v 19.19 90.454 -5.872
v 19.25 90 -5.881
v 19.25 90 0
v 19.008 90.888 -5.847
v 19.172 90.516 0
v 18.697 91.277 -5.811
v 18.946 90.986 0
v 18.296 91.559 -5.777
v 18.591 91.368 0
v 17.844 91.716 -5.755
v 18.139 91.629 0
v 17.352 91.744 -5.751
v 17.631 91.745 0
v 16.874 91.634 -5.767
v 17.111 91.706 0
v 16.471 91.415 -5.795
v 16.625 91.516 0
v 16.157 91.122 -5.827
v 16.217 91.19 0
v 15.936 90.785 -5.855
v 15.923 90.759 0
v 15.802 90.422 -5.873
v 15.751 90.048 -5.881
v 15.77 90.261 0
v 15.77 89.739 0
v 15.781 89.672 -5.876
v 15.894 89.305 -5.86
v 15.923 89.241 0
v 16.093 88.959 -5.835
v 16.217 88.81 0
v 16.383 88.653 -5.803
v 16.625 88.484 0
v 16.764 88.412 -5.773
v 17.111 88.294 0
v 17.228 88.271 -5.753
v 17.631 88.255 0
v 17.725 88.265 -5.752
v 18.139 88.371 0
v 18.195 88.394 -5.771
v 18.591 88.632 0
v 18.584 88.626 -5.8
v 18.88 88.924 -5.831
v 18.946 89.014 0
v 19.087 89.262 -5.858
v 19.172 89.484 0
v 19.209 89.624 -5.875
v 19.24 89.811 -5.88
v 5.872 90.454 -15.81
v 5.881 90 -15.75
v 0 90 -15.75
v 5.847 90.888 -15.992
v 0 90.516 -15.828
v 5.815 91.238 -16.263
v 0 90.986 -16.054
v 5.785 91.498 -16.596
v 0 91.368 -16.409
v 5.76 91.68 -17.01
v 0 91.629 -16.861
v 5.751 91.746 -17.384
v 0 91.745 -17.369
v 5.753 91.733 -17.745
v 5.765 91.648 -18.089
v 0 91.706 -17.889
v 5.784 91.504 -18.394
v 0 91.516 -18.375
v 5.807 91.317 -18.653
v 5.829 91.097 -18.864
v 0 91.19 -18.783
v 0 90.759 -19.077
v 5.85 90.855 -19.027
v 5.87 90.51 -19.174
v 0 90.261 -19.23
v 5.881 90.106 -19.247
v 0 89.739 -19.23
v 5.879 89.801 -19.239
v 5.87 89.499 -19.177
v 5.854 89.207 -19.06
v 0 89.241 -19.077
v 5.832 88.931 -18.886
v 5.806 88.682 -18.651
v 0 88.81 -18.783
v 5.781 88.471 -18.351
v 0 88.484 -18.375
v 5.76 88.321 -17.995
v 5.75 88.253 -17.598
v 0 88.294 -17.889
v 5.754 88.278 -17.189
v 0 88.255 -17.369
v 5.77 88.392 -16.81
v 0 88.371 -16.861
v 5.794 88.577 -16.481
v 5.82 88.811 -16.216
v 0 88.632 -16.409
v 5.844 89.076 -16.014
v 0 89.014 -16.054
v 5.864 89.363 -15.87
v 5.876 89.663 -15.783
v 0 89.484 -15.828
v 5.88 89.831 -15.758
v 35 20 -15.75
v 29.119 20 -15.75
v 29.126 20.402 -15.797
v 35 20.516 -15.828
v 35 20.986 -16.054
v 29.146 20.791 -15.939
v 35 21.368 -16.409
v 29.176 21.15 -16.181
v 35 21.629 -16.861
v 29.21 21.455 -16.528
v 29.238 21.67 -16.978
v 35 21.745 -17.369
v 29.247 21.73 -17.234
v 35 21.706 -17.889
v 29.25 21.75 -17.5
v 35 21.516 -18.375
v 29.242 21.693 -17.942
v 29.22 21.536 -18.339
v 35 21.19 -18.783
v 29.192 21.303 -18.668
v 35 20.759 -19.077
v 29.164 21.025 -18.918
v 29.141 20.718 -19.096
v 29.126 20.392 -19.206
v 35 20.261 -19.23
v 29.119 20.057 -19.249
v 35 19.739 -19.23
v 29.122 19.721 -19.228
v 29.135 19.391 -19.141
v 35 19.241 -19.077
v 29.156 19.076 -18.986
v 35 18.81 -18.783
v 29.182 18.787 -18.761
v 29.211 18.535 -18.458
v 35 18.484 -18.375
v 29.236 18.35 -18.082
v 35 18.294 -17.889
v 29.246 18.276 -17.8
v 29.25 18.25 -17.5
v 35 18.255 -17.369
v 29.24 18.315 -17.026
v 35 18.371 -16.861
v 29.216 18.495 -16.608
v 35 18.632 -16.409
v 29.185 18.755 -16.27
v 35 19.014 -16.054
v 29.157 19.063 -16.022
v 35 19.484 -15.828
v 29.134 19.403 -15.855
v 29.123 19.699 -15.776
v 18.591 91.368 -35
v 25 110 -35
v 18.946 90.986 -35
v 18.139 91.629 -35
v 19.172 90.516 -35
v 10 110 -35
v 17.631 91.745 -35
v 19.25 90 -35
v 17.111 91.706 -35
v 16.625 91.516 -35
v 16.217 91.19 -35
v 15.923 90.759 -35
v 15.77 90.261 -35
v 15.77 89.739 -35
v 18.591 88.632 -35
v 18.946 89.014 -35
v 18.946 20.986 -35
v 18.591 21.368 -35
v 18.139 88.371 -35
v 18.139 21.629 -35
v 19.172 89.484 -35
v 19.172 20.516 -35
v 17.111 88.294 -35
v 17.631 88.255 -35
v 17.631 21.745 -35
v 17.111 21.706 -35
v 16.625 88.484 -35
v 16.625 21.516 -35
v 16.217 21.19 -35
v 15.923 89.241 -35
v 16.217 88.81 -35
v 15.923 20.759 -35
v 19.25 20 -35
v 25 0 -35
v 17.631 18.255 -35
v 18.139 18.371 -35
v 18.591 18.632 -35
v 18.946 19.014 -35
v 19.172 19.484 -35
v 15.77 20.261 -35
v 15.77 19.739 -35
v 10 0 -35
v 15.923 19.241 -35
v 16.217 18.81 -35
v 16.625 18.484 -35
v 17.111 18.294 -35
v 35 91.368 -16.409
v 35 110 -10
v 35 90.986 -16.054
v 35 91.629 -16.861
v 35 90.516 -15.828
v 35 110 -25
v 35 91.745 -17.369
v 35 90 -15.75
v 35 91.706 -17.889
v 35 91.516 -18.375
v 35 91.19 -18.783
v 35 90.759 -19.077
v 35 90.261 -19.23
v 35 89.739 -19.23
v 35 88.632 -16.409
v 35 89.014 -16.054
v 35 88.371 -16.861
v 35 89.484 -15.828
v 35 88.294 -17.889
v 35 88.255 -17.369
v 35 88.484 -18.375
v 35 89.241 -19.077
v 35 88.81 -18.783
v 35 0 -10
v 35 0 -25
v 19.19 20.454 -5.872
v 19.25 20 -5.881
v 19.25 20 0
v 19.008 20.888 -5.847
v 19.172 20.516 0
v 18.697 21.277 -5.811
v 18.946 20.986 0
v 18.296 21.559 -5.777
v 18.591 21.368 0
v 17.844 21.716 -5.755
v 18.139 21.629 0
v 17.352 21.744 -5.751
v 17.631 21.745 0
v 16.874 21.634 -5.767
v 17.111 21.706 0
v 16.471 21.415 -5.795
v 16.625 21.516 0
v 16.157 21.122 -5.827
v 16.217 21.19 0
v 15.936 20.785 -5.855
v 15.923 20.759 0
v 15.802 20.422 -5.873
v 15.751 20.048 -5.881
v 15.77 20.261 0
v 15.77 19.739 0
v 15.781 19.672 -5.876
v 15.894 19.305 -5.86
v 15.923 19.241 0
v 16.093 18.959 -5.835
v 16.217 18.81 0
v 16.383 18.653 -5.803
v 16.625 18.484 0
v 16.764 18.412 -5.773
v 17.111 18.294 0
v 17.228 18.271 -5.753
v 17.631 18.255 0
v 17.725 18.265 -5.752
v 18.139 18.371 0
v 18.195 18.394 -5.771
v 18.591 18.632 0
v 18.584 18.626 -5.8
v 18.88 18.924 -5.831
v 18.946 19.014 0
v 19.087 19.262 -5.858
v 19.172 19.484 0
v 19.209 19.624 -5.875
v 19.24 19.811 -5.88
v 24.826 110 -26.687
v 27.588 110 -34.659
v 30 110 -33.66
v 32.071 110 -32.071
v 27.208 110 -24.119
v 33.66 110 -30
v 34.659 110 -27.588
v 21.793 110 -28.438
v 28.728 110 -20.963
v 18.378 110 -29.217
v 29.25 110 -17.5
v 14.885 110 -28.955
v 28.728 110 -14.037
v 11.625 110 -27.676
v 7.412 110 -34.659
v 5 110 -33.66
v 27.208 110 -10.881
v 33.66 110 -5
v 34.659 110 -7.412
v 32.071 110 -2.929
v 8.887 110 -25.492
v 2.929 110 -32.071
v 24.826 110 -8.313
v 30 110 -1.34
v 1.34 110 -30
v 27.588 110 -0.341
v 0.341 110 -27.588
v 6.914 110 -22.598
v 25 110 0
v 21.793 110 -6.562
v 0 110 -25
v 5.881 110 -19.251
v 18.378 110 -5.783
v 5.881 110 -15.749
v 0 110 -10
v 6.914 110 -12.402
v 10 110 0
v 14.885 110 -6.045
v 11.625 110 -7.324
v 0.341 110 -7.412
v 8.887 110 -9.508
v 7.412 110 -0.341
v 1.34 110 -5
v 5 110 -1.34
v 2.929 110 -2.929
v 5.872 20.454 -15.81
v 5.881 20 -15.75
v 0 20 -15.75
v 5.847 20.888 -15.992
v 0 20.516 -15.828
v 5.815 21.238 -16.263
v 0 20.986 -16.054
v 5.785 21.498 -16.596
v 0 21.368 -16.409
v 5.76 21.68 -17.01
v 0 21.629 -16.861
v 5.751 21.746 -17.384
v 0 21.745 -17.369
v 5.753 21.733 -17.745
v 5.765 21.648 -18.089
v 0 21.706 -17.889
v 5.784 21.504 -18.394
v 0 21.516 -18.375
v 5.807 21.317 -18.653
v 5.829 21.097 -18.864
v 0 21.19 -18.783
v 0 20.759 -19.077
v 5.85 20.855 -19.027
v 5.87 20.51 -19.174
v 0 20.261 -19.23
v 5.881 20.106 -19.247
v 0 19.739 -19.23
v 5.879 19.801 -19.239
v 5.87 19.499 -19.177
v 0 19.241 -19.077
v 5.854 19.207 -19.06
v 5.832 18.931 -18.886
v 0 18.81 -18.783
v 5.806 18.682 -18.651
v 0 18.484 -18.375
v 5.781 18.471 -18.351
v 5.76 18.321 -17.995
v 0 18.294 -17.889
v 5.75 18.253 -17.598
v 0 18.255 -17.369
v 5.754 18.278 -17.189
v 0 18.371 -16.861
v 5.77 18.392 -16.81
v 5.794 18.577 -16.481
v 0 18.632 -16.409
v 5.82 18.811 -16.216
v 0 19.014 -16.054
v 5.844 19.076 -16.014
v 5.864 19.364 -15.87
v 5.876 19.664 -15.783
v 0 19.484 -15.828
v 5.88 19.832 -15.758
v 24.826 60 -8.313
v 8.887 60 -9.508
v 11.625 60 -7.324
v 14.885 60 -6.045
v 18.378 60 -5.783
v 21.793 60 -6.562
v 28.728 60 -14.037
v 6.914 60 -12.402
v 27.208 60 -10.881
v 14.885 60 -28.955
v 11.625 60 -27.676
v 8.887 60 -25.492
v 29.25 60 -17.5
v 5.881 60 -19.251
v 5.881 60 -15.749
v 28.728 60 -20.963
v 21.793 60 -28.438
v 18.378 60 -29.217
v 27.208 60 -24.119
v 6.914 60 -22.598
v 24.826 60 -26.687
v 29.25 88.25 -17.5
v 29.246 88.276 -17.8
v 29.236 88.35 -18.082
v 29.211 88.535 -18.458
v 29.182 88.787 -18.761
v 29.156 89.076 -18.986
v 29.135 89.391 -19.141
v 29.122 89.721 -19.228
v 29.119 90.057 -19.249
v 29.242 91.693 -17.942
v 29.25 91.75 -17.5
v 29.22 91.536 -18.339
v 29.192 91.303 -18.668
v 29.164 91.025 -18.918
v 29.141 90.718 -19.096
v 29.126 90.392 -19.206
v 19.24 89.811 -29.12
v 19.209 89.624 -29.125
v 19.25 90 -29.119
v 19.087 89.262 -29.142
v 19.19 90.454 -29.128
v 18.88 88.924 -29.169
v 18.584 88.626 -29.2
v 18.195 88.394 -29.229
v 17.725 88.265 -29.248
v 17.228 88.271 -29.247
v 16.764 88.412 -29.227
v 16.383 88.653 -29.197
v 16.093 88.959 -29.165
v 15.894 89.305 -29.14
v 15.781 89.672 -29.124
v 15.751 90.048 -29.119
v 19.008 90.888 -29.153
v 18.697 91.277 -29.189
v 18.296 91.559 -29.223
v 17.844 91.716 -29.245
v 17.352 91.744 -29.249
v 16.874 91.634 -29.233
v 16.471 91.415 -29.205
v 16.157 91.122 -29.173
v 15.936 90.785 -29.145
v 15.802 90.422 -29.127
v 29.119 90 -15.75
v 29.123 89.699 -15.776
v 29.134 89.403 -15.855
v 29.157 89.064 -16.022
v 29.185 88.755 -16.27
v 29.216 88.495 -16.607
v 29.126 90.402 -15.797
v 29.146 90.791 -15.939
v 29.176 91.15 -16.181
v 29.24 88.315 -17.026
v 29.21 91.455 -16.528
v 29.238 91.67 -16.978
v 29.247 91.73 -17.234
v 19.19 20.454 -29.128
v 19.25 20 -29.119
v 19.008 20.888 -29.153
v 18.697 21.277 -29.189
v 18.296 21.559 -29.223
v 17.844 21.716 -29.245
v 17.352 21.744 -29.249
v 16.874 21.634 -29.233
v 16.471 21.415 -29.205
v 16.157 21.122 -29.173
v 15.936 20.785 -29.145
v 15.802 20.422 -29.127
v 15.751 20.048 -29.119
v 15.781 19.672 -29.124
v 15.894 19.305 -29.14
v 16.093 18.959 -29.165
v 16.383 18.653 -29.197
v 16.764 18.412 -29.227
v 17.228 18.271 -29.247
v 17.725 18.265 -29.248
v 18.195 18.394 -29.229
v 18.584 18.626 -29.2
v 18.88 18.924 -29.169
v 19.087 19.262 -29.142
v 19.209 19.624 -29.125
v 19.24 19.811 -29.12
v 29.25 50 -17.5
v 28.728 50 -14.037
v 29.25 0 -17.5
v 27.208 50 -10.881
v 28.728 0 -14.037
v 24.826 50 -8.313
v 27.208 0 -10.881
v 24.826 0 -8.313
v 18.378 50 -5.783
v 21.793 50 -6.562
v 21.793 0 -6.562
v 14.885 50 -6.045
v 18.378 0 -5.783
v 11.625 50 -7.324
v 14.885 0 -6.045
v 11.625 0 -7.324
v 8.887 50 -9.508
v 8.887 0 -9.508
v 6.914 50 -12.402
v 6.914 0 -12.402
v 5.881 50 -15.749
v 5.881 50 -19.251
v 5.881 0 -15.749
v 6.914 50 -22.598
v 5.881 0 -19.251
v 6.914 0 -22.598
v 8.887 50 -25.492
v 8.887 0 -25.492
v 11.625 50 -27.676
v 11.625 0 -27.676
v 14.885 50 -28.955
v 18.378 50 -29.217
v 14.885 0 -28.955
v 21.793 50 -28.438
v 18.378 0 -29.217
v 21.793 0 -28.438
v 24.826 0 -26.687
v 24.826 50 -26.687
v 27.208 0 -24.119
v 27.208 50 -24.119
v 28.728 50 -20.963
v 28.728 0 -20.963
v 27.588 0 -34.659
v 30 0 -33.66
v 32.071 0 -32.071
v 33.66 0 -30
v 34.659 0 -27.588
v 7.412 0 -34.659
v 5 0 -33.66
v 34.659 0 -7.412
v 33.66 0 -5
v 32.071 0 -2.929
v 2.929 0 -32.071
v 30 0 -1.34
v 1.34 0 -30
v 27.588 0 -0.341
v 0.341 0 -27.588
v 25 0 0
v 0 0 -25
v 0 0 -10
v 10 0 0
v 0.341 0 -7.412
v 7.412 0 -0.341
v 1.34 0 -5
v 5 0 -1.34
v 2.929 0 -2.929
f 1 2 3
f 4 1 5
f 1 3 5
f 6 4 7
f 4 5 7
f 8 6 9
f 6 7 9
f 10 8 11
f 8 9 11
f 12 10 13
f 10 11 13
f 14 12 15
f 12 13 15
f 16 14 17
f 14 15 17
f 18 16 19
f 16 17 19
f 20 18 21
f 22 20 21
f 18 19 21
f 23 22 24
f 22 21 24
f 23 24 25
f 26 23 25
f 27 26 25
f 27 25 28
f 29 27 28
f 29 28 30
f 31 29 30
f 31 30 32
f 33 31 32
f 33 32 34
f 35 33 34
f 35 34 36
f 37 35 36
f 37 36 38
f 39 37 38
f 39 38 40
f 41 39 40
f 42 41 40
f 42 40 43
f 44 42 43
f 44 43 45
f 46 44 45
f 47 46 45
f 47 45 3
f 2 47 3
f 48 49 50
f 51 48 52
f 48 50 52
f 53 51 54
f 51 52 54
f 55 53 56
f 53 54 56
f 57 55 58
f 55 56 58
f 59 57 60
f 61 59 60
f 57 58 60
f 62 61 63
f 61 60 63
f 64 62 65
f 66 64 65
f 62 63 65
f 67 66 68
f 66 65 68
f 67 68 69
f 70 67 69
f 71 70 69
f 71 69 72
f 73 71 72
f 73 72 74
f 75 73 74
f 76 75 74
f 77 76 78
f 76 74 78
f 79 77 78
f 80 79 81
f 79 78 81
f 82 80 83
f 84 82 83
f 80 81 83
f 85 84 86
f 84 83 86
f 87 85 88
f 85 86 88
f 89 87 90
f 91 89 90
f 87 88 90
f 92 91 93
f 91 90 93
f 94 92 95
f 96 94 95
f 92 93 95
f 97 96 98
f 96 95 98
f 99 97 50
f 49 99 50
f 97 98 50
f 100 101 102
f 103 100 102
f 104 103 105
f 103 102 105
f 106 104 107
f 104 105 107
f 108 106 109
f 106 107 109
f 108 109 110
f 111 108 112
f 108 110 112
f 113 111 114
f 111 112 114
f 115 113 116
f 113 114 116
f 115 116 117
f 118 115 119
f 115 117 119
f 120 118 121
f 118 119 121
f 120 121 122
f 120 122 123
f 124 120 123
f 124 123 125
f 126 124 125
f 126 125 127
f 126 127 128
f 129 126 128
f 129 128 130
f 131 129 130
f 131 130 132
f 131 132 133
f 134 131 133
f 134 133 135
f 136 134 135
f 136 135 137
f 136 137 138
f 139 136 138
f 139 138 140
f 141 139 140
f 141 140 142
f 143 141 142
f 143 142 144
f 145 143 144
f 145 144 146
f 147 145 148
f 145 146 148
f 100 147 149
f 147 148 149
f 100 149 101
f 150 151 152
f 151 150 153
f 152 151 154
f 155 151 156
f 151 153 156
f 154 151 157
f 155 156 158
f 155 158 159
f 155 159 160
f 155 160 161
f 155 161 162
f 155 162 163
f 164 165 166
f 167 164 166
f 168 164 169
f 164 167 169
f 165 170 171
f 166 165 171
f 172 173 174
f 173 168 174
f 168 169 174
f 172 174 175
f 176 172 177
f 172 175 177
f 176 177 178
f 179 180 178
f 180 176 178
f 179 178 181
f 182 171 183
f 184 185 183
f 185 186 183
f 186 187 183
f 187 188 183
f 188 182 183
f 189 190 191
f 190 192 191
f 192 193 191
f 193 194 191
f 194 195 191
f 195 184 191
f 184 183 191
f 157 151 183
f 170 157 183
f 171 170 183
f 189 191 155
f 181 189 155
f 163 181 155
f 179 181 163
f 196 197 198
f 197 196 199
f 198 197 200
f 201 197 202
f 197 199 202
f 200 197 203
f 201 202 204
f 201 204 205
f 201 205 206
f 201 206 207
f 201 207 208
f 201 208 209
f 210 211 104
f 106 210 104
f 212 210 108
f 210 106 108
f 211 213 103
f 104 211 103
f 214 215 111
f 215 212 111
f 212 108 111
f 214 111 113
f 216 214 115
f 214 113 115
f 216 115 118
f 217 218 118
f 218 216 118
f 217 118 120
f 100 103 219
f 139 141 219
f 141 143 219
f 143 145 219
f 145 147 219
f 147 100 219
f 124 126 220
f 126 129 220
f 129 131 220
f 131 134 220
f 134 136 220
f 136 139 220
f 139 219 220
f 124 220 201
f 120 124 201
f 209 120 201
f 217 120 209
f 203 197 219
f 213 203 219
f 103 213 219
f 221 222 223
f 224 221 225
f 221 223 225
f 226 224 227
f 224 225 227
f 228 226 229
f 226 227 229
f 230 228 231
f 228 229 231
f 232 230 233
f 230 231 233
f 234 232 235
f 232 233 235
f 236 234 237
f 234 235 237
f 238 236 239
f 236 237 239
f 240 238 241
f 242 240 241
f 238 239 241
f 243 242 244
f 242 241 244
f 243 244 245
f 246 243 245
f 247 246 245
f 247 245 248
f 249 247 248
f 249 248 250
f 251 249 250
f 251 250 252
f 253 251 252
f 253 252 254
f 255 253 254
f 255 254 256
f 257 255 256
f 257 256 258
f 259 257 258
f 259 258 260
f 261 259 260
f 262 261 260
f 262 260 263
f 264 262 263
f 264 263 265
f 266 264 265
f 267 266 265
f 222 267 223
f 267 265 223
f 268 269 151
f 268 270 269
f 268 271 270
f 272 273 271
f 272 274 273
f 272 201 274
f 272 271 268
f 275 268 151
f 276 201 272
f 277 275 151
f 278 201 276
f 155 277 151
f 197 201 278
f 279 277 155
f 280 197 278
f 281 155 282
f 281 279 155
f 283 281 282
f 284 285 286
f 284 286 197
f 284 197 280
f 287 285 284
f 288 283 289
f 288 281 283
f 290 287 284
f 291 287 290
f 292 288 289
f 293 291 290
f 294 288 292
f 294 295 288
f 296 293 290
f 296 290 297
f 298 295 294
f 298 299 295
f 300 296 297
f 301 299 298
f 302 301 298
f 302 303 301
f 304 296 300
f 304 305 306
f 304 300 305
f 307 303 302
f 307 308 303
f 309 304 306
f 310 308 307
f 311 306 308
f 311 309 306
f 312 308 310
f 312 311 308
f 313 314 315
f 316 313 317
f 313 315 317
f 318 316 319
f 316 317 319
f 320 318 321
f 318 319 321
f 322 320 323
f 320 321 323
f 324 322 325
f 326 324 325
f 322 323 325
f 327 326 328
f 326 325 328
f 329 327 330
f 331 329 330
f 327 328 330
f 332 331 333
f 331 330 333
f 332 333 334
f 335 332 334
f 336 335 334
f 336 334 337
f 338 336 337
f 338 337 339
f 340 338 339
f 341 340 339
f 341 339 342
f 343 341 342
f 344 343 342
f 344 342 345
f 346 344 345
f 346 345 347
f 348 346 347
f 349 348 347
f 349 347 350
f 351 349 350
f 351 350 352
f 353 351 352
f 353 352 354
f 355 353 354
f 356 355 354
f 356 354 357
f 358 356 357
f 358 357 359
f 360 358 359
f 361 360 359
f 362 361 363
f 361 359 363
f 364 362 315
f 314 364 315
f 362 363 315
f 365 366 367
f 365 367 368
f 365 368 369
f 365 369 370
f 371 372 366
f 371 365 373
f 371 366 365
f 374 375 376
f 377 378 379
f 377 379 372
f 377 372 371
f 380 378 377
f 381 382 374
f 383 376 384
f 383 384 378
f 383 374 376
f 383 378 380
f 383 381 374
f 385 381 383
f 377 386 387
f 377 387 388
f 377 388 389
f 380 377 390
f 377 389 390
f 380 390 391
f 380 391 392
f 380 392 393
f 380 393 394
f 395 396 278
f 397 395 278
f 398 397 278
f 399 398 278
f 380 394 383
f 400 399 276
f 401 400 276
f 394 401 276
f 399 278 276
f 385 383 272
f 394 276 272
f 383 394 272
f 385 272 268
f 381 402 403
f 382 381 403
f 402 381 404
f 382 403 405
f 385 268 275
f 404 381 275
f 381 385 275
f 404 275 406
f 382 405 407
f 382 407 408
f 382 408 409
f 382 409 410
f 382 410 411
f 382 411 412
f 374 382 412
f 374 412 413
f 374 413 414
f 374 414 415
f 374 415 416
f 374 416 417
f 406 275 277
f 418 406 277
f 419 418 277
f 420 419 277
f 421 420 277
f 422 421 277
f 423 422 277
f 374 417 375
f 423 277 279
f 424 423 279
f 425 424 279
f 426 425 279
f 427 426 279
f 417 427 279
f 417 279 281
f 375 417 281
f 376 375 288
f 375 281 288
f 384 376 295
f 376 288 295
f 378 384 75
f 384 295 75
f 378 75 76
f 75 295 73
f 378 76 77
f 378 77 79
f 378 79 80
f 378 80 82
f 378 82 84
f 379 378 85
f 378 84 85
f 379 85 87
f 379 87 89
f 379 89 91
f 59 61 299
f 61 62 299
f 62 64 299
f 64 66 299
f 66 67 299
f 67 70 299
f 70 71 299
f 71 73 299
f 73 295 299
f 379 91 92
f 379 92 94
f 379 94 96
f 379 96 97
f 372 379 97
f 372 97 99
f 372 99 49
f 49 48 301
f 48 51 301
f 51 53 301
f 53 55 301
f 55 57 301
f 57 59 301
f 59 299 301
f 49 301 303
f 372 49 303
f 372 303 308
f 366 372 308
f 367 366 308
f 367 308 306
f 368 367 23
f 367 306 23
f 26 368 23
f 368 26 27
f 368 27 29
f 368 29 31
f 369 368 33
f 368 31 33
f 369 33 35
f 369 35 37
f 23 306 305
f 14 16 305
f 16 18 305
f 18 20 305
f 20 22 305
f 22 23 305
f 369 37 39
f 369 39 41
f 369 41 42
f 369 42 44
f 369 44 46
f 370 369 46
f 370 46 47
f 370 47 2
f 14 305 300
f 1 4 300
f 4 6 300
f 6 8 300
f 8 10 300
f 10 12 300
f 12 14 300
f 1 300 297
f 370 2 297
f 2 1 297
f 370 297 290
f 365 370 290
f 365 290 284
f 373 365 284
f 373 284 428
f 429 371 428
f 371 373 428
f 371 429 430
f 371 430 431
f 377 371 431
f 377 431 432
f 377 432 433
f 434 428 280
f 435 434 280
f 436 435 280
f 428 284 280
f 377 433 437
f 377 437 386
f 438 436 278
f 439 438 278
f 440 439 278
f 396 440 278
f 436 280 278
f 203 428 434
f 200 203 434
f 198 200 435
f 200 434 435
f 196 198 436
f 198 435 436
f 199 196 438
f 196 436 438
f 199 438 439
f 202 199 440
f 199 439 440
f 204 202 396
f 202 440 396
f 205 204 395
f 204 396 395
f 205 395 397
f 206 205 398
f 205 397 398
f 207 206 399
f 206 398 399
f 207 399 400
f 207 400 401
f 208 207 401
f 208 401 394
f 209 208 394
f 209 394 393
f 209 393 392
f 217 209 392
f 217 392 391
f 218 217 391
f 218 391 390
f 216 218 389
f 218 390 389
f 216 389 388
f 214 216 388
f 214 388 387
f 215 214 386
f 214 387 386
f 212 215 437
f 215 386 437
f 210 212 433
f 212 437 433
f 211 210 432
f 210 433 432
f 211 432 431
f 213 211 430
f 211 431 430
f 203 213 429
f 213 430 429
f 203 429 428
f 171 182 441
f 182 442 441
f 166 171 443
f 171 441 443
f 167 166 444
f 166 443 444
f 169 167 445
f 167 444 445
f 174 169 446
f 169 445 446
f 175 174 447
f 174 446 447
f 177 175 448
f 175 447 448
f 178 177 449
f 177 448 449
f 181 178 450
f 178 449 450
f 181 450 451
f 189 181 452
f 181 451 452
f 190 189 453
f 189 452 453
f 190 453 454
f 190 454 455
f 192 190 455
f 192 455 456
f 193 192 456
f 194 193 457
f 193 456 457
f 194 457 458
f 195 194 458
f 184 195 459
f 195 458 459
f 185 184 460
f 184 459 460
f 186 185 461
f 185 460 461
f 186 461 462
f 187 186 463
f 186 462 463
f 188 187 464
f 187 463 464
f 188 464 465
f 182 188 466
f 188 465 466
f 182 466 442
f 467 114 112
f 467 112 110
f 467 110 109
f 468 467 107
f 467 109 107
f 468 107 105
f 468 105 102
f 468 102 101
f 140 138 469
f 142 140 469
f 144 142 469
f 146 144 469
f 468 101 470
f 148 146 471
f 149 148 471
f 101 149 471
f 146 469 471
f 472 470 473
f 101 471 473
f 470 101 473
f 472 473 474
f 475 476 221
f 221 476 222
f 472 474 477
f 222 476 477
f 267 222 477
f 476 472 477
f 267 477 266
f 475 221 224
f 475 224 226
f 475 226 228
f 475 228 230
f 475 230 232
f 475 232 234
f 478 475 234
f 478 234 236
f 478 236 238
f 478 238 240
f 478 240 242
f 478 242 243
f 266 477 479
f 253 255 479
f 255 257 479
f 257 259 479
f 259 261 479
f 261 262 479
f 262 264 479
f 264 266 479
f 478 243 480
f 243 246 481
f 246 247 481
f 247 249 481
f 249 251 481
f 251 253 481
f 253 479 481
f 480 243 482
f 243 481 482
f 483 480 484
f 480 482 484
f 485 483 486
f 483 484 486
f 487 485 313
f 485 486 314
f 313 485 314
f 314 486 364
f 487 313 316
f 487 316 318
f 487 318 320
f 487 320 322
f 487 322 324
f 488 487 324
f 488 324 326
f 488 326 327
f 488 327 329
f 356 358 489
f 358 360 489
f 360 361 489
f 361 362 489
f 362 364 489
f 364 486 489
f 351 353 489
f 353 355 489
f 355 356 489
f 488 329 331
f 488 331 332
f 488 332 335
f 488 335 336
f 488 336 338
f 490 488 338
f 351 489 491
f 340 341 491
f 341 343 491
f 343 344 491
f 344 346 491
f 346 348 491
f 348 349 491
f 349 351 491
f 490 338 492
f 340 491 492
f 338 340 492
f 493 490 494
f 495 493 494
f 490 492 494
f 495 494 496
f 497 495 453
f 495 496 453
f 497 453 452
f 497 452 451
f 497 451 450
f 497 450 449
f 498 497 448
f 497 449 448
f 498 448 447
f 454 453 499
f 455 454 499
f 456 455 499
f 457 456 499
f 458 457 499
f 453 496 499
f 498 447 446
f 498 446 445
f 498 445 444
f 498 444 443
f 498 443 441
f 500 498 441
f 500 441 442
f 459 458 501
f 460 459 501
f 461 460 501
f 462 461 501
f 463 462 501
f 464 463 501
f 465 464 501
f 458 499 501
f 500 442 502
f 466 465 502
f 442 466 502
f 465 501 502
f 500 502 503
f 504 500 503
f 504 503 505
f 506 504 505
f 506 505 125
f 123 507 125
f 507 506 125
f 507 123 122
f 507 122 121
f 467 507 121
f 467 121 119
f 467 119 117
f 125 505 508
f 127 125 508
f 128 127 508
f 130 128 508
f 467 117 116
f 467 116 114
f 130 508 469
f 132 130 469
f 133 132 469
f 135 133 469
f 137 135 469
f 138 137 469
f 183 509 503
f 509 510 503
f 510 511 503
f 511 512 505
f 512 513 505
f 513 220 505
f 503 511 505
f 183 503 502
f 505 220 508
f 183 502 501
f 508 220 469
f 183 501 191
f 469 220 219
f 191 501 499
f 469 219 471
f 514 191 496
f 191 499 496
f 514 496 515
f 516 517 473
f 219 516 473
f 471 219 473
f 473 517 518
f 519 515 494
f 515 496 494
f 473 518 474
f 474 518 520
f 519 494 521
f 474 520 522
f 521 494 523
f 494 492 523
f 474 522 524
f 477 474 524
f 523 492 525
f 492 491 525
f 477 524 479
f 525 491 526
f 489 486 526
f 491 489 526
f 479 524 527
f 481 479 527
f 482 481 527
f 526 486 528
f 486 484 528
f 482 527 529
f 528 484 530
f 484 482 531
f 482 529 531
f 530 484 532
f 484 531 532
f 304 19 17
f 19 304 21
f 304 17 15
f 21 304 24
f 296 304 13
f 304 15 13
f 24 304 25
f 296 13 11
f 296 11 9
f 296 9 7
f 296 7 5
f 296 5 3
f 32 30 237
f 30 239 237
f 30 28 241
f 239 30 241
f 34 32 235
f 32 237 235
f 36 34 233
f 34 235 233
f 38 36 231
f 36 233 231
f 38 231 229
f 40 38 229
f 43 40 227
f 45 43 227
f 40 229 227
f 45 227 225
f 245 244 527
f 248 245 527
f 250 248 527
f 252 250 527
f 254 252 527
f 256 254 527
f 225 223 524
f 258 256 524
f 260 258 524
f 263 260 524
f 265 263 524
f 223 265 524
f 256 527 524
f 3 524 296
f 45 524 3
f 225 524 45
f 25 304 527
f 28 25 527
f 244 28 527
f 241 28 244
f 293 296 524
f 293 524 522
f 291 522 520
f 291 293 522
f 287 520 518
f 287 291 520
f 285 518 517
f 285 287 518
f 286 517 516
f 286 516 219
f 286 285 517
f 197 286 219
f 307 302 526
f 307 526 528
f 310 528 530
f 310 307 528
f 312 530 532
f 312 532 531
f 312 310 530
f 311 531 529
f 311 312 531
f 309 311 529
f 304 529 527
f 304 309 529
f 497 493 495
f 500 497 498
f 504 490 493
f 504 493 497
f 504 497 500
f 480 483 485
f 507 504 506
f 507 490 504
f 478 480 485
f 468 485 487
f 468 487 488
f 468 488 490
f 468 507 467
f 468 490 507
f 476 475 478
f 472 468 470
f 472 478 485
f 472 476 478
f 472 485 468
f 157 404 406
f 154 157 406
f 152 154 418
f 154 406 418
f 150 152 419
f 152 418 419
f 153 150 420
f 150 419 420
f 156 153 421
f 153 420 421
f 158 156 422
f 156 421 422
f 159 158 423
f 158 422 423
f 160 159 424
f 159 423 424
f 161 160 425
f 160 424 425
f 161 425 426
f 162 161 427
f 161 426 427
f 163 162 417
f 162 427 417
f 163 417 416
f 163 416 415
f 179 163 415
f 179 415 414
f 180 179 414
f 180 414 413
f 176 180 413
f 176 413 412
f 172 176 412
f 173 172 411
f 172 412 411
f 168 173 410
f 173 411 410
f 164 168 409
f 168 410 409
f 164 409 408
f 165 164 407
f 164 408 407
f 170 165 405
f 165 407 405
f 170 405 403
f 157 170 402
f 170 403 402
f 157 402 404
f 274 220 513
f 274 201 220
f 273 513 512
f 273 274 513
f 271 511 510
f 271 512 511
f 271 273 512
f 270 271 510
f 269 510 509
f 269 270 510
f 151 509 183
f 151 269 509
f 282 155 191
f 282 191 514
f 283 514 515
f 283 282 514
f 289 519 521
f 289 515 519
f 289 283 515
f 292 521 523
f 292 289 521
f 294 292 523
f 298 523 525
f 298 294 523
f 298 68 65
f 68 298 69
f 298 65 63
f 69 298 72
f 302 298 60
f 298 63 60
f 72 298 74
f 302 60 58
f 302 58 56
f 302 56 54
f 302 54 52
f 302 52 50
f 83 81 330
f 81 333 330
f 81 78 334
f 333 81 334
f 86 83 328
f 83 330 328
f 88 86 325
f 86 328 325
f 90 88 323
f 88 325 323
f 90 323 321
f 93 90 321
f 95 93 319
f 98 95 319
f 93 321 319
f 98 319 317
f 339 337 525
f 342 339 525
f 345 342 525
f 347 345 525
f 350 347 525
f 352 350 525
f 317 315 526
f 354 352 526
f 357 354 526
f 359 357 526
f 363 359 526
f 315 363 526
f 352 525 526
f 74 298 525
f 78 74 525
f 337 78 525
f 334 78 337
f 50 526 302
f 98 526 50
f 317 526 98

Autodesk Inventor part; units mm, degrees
ref_plane "YZ Plane" through (0, 0, 0) normal (1, 0, 0) x (0, 1, 0)
ref_plane "XZ Plane" through (0, 0, 0) normal (0, 1, 0) x (-1, 0, 0)
ref_plane "XY Plane" through (0, 0, 0) normal (0, 0, 1) x (1, 0, 0)
sketch "Sketch1" plane through (0, 0, 0) normal (0, 1, 0) x (-1, 0, 0)
  line L0 (0, 0) -> (-35, 0)
  line L1 (-35, 0) -> (-35, -35)
  line L2 (-35, -35) -> (0, -35)
  line L3 (0, -35) -> (0, 0)
  dimension "d0" = 35
  dimension "d1" = 35
extrude "Extrusion1" add sketch "Sketch1" along normal blind 110
sketch "Sketch2" plane through (0, 110, 0) normal (0, 1, 0) x (1, 0, 0)
  line L0 (0, 35) -> (0, 0) construction
  line L1 (0, 0) -> (35, 0) construction
  line L2 (0, 35) -> (35, 0) construction
  circle A0 centre (17.5, 17.5) radius 11.75
  dimension "d4" = 23.5
extrude "Extrusion2" cut sketch "Sketch2" against normal blind 50
sketch "Sketch3" plane through (0, 0, 0) normal (0, -1, 0) x (1, 0, 0)
  line L0 (35, -35) -> (0, -35) construction
  line L1 (35, -35) -> (0, 0) construction
  circle A0 centre (17.5, -17.5) radius 11.75
  dimension "d7" = 23.5
extrude "Extrusion3" cut sketch "Sketch3" against normal blind 50
sketch "Sketch4" plane through (0, 0, 0) normal (0, 0, 1) x (1, 0, 0)
  circle A0 centre (17.5, 90) radius 1.75
  line L0 (0, 110) -> (35, 110) projected
  circle A1 centre (17.5, 20) radius 1.75
  line L1 (0, 0) -> (35, 0) projected
  line L2 (0, 0) -> (0, 110) projected
  line L3 (35, 0) -> (35, 110) projected
  dimension "d10" = 3.5
  dimension "d11" = 20
  dimension "d12" = 3.5
  dimension "d13" = 20
  dimension "d24" = 35
  dimension "d25" = 17.5
  dimension "d26" = 17.5
extrude "Extrusion4" cut sketch "Sketch4" against normal blind 36 contours A0 | A1
sketch "Sketch5" plane through (0, 0, -35) normal (-1, 0, 0) x (0, 0, 1)
  circle A0 centre (17.5, 90) radius 1.75
  circle A1 centre (17.5, 20) radius 1.75
  line L0 (0, 110) -> (35, 110) projected
  line L1 (0, 0) -> (35, 0) projected
  line L2 (0, 0) -> (0, 110) projected
  line L3 (35, 0) -> (35, 110) projected
  dimension "d16" = 3.5
  dimension "d17" = 3.5
  dimension "d18" = 20
  dimension "d19" = 20
  dimension "d27" = 35
  dimension "d28" = 17.5
  dimension "d29" = 17.5
extrude "Extrusion5" cut sketch "Sketch5" against normal blind 36 contours A0 | A1
fillet "Fillet1" radius 10 4 edges at (35, 55, 0) (35, 55, -35) (0, 55, -35) (0, 55, 0)
equation "\"d25\" = 0.5 * d24"
equation "\"d26\" = 0.5 * d24"
equation "\"d28\" = 0.5 * d27"
equation "\"d29\" = 0.5 * d27"
properties part number "Rod_Joint_v2"
